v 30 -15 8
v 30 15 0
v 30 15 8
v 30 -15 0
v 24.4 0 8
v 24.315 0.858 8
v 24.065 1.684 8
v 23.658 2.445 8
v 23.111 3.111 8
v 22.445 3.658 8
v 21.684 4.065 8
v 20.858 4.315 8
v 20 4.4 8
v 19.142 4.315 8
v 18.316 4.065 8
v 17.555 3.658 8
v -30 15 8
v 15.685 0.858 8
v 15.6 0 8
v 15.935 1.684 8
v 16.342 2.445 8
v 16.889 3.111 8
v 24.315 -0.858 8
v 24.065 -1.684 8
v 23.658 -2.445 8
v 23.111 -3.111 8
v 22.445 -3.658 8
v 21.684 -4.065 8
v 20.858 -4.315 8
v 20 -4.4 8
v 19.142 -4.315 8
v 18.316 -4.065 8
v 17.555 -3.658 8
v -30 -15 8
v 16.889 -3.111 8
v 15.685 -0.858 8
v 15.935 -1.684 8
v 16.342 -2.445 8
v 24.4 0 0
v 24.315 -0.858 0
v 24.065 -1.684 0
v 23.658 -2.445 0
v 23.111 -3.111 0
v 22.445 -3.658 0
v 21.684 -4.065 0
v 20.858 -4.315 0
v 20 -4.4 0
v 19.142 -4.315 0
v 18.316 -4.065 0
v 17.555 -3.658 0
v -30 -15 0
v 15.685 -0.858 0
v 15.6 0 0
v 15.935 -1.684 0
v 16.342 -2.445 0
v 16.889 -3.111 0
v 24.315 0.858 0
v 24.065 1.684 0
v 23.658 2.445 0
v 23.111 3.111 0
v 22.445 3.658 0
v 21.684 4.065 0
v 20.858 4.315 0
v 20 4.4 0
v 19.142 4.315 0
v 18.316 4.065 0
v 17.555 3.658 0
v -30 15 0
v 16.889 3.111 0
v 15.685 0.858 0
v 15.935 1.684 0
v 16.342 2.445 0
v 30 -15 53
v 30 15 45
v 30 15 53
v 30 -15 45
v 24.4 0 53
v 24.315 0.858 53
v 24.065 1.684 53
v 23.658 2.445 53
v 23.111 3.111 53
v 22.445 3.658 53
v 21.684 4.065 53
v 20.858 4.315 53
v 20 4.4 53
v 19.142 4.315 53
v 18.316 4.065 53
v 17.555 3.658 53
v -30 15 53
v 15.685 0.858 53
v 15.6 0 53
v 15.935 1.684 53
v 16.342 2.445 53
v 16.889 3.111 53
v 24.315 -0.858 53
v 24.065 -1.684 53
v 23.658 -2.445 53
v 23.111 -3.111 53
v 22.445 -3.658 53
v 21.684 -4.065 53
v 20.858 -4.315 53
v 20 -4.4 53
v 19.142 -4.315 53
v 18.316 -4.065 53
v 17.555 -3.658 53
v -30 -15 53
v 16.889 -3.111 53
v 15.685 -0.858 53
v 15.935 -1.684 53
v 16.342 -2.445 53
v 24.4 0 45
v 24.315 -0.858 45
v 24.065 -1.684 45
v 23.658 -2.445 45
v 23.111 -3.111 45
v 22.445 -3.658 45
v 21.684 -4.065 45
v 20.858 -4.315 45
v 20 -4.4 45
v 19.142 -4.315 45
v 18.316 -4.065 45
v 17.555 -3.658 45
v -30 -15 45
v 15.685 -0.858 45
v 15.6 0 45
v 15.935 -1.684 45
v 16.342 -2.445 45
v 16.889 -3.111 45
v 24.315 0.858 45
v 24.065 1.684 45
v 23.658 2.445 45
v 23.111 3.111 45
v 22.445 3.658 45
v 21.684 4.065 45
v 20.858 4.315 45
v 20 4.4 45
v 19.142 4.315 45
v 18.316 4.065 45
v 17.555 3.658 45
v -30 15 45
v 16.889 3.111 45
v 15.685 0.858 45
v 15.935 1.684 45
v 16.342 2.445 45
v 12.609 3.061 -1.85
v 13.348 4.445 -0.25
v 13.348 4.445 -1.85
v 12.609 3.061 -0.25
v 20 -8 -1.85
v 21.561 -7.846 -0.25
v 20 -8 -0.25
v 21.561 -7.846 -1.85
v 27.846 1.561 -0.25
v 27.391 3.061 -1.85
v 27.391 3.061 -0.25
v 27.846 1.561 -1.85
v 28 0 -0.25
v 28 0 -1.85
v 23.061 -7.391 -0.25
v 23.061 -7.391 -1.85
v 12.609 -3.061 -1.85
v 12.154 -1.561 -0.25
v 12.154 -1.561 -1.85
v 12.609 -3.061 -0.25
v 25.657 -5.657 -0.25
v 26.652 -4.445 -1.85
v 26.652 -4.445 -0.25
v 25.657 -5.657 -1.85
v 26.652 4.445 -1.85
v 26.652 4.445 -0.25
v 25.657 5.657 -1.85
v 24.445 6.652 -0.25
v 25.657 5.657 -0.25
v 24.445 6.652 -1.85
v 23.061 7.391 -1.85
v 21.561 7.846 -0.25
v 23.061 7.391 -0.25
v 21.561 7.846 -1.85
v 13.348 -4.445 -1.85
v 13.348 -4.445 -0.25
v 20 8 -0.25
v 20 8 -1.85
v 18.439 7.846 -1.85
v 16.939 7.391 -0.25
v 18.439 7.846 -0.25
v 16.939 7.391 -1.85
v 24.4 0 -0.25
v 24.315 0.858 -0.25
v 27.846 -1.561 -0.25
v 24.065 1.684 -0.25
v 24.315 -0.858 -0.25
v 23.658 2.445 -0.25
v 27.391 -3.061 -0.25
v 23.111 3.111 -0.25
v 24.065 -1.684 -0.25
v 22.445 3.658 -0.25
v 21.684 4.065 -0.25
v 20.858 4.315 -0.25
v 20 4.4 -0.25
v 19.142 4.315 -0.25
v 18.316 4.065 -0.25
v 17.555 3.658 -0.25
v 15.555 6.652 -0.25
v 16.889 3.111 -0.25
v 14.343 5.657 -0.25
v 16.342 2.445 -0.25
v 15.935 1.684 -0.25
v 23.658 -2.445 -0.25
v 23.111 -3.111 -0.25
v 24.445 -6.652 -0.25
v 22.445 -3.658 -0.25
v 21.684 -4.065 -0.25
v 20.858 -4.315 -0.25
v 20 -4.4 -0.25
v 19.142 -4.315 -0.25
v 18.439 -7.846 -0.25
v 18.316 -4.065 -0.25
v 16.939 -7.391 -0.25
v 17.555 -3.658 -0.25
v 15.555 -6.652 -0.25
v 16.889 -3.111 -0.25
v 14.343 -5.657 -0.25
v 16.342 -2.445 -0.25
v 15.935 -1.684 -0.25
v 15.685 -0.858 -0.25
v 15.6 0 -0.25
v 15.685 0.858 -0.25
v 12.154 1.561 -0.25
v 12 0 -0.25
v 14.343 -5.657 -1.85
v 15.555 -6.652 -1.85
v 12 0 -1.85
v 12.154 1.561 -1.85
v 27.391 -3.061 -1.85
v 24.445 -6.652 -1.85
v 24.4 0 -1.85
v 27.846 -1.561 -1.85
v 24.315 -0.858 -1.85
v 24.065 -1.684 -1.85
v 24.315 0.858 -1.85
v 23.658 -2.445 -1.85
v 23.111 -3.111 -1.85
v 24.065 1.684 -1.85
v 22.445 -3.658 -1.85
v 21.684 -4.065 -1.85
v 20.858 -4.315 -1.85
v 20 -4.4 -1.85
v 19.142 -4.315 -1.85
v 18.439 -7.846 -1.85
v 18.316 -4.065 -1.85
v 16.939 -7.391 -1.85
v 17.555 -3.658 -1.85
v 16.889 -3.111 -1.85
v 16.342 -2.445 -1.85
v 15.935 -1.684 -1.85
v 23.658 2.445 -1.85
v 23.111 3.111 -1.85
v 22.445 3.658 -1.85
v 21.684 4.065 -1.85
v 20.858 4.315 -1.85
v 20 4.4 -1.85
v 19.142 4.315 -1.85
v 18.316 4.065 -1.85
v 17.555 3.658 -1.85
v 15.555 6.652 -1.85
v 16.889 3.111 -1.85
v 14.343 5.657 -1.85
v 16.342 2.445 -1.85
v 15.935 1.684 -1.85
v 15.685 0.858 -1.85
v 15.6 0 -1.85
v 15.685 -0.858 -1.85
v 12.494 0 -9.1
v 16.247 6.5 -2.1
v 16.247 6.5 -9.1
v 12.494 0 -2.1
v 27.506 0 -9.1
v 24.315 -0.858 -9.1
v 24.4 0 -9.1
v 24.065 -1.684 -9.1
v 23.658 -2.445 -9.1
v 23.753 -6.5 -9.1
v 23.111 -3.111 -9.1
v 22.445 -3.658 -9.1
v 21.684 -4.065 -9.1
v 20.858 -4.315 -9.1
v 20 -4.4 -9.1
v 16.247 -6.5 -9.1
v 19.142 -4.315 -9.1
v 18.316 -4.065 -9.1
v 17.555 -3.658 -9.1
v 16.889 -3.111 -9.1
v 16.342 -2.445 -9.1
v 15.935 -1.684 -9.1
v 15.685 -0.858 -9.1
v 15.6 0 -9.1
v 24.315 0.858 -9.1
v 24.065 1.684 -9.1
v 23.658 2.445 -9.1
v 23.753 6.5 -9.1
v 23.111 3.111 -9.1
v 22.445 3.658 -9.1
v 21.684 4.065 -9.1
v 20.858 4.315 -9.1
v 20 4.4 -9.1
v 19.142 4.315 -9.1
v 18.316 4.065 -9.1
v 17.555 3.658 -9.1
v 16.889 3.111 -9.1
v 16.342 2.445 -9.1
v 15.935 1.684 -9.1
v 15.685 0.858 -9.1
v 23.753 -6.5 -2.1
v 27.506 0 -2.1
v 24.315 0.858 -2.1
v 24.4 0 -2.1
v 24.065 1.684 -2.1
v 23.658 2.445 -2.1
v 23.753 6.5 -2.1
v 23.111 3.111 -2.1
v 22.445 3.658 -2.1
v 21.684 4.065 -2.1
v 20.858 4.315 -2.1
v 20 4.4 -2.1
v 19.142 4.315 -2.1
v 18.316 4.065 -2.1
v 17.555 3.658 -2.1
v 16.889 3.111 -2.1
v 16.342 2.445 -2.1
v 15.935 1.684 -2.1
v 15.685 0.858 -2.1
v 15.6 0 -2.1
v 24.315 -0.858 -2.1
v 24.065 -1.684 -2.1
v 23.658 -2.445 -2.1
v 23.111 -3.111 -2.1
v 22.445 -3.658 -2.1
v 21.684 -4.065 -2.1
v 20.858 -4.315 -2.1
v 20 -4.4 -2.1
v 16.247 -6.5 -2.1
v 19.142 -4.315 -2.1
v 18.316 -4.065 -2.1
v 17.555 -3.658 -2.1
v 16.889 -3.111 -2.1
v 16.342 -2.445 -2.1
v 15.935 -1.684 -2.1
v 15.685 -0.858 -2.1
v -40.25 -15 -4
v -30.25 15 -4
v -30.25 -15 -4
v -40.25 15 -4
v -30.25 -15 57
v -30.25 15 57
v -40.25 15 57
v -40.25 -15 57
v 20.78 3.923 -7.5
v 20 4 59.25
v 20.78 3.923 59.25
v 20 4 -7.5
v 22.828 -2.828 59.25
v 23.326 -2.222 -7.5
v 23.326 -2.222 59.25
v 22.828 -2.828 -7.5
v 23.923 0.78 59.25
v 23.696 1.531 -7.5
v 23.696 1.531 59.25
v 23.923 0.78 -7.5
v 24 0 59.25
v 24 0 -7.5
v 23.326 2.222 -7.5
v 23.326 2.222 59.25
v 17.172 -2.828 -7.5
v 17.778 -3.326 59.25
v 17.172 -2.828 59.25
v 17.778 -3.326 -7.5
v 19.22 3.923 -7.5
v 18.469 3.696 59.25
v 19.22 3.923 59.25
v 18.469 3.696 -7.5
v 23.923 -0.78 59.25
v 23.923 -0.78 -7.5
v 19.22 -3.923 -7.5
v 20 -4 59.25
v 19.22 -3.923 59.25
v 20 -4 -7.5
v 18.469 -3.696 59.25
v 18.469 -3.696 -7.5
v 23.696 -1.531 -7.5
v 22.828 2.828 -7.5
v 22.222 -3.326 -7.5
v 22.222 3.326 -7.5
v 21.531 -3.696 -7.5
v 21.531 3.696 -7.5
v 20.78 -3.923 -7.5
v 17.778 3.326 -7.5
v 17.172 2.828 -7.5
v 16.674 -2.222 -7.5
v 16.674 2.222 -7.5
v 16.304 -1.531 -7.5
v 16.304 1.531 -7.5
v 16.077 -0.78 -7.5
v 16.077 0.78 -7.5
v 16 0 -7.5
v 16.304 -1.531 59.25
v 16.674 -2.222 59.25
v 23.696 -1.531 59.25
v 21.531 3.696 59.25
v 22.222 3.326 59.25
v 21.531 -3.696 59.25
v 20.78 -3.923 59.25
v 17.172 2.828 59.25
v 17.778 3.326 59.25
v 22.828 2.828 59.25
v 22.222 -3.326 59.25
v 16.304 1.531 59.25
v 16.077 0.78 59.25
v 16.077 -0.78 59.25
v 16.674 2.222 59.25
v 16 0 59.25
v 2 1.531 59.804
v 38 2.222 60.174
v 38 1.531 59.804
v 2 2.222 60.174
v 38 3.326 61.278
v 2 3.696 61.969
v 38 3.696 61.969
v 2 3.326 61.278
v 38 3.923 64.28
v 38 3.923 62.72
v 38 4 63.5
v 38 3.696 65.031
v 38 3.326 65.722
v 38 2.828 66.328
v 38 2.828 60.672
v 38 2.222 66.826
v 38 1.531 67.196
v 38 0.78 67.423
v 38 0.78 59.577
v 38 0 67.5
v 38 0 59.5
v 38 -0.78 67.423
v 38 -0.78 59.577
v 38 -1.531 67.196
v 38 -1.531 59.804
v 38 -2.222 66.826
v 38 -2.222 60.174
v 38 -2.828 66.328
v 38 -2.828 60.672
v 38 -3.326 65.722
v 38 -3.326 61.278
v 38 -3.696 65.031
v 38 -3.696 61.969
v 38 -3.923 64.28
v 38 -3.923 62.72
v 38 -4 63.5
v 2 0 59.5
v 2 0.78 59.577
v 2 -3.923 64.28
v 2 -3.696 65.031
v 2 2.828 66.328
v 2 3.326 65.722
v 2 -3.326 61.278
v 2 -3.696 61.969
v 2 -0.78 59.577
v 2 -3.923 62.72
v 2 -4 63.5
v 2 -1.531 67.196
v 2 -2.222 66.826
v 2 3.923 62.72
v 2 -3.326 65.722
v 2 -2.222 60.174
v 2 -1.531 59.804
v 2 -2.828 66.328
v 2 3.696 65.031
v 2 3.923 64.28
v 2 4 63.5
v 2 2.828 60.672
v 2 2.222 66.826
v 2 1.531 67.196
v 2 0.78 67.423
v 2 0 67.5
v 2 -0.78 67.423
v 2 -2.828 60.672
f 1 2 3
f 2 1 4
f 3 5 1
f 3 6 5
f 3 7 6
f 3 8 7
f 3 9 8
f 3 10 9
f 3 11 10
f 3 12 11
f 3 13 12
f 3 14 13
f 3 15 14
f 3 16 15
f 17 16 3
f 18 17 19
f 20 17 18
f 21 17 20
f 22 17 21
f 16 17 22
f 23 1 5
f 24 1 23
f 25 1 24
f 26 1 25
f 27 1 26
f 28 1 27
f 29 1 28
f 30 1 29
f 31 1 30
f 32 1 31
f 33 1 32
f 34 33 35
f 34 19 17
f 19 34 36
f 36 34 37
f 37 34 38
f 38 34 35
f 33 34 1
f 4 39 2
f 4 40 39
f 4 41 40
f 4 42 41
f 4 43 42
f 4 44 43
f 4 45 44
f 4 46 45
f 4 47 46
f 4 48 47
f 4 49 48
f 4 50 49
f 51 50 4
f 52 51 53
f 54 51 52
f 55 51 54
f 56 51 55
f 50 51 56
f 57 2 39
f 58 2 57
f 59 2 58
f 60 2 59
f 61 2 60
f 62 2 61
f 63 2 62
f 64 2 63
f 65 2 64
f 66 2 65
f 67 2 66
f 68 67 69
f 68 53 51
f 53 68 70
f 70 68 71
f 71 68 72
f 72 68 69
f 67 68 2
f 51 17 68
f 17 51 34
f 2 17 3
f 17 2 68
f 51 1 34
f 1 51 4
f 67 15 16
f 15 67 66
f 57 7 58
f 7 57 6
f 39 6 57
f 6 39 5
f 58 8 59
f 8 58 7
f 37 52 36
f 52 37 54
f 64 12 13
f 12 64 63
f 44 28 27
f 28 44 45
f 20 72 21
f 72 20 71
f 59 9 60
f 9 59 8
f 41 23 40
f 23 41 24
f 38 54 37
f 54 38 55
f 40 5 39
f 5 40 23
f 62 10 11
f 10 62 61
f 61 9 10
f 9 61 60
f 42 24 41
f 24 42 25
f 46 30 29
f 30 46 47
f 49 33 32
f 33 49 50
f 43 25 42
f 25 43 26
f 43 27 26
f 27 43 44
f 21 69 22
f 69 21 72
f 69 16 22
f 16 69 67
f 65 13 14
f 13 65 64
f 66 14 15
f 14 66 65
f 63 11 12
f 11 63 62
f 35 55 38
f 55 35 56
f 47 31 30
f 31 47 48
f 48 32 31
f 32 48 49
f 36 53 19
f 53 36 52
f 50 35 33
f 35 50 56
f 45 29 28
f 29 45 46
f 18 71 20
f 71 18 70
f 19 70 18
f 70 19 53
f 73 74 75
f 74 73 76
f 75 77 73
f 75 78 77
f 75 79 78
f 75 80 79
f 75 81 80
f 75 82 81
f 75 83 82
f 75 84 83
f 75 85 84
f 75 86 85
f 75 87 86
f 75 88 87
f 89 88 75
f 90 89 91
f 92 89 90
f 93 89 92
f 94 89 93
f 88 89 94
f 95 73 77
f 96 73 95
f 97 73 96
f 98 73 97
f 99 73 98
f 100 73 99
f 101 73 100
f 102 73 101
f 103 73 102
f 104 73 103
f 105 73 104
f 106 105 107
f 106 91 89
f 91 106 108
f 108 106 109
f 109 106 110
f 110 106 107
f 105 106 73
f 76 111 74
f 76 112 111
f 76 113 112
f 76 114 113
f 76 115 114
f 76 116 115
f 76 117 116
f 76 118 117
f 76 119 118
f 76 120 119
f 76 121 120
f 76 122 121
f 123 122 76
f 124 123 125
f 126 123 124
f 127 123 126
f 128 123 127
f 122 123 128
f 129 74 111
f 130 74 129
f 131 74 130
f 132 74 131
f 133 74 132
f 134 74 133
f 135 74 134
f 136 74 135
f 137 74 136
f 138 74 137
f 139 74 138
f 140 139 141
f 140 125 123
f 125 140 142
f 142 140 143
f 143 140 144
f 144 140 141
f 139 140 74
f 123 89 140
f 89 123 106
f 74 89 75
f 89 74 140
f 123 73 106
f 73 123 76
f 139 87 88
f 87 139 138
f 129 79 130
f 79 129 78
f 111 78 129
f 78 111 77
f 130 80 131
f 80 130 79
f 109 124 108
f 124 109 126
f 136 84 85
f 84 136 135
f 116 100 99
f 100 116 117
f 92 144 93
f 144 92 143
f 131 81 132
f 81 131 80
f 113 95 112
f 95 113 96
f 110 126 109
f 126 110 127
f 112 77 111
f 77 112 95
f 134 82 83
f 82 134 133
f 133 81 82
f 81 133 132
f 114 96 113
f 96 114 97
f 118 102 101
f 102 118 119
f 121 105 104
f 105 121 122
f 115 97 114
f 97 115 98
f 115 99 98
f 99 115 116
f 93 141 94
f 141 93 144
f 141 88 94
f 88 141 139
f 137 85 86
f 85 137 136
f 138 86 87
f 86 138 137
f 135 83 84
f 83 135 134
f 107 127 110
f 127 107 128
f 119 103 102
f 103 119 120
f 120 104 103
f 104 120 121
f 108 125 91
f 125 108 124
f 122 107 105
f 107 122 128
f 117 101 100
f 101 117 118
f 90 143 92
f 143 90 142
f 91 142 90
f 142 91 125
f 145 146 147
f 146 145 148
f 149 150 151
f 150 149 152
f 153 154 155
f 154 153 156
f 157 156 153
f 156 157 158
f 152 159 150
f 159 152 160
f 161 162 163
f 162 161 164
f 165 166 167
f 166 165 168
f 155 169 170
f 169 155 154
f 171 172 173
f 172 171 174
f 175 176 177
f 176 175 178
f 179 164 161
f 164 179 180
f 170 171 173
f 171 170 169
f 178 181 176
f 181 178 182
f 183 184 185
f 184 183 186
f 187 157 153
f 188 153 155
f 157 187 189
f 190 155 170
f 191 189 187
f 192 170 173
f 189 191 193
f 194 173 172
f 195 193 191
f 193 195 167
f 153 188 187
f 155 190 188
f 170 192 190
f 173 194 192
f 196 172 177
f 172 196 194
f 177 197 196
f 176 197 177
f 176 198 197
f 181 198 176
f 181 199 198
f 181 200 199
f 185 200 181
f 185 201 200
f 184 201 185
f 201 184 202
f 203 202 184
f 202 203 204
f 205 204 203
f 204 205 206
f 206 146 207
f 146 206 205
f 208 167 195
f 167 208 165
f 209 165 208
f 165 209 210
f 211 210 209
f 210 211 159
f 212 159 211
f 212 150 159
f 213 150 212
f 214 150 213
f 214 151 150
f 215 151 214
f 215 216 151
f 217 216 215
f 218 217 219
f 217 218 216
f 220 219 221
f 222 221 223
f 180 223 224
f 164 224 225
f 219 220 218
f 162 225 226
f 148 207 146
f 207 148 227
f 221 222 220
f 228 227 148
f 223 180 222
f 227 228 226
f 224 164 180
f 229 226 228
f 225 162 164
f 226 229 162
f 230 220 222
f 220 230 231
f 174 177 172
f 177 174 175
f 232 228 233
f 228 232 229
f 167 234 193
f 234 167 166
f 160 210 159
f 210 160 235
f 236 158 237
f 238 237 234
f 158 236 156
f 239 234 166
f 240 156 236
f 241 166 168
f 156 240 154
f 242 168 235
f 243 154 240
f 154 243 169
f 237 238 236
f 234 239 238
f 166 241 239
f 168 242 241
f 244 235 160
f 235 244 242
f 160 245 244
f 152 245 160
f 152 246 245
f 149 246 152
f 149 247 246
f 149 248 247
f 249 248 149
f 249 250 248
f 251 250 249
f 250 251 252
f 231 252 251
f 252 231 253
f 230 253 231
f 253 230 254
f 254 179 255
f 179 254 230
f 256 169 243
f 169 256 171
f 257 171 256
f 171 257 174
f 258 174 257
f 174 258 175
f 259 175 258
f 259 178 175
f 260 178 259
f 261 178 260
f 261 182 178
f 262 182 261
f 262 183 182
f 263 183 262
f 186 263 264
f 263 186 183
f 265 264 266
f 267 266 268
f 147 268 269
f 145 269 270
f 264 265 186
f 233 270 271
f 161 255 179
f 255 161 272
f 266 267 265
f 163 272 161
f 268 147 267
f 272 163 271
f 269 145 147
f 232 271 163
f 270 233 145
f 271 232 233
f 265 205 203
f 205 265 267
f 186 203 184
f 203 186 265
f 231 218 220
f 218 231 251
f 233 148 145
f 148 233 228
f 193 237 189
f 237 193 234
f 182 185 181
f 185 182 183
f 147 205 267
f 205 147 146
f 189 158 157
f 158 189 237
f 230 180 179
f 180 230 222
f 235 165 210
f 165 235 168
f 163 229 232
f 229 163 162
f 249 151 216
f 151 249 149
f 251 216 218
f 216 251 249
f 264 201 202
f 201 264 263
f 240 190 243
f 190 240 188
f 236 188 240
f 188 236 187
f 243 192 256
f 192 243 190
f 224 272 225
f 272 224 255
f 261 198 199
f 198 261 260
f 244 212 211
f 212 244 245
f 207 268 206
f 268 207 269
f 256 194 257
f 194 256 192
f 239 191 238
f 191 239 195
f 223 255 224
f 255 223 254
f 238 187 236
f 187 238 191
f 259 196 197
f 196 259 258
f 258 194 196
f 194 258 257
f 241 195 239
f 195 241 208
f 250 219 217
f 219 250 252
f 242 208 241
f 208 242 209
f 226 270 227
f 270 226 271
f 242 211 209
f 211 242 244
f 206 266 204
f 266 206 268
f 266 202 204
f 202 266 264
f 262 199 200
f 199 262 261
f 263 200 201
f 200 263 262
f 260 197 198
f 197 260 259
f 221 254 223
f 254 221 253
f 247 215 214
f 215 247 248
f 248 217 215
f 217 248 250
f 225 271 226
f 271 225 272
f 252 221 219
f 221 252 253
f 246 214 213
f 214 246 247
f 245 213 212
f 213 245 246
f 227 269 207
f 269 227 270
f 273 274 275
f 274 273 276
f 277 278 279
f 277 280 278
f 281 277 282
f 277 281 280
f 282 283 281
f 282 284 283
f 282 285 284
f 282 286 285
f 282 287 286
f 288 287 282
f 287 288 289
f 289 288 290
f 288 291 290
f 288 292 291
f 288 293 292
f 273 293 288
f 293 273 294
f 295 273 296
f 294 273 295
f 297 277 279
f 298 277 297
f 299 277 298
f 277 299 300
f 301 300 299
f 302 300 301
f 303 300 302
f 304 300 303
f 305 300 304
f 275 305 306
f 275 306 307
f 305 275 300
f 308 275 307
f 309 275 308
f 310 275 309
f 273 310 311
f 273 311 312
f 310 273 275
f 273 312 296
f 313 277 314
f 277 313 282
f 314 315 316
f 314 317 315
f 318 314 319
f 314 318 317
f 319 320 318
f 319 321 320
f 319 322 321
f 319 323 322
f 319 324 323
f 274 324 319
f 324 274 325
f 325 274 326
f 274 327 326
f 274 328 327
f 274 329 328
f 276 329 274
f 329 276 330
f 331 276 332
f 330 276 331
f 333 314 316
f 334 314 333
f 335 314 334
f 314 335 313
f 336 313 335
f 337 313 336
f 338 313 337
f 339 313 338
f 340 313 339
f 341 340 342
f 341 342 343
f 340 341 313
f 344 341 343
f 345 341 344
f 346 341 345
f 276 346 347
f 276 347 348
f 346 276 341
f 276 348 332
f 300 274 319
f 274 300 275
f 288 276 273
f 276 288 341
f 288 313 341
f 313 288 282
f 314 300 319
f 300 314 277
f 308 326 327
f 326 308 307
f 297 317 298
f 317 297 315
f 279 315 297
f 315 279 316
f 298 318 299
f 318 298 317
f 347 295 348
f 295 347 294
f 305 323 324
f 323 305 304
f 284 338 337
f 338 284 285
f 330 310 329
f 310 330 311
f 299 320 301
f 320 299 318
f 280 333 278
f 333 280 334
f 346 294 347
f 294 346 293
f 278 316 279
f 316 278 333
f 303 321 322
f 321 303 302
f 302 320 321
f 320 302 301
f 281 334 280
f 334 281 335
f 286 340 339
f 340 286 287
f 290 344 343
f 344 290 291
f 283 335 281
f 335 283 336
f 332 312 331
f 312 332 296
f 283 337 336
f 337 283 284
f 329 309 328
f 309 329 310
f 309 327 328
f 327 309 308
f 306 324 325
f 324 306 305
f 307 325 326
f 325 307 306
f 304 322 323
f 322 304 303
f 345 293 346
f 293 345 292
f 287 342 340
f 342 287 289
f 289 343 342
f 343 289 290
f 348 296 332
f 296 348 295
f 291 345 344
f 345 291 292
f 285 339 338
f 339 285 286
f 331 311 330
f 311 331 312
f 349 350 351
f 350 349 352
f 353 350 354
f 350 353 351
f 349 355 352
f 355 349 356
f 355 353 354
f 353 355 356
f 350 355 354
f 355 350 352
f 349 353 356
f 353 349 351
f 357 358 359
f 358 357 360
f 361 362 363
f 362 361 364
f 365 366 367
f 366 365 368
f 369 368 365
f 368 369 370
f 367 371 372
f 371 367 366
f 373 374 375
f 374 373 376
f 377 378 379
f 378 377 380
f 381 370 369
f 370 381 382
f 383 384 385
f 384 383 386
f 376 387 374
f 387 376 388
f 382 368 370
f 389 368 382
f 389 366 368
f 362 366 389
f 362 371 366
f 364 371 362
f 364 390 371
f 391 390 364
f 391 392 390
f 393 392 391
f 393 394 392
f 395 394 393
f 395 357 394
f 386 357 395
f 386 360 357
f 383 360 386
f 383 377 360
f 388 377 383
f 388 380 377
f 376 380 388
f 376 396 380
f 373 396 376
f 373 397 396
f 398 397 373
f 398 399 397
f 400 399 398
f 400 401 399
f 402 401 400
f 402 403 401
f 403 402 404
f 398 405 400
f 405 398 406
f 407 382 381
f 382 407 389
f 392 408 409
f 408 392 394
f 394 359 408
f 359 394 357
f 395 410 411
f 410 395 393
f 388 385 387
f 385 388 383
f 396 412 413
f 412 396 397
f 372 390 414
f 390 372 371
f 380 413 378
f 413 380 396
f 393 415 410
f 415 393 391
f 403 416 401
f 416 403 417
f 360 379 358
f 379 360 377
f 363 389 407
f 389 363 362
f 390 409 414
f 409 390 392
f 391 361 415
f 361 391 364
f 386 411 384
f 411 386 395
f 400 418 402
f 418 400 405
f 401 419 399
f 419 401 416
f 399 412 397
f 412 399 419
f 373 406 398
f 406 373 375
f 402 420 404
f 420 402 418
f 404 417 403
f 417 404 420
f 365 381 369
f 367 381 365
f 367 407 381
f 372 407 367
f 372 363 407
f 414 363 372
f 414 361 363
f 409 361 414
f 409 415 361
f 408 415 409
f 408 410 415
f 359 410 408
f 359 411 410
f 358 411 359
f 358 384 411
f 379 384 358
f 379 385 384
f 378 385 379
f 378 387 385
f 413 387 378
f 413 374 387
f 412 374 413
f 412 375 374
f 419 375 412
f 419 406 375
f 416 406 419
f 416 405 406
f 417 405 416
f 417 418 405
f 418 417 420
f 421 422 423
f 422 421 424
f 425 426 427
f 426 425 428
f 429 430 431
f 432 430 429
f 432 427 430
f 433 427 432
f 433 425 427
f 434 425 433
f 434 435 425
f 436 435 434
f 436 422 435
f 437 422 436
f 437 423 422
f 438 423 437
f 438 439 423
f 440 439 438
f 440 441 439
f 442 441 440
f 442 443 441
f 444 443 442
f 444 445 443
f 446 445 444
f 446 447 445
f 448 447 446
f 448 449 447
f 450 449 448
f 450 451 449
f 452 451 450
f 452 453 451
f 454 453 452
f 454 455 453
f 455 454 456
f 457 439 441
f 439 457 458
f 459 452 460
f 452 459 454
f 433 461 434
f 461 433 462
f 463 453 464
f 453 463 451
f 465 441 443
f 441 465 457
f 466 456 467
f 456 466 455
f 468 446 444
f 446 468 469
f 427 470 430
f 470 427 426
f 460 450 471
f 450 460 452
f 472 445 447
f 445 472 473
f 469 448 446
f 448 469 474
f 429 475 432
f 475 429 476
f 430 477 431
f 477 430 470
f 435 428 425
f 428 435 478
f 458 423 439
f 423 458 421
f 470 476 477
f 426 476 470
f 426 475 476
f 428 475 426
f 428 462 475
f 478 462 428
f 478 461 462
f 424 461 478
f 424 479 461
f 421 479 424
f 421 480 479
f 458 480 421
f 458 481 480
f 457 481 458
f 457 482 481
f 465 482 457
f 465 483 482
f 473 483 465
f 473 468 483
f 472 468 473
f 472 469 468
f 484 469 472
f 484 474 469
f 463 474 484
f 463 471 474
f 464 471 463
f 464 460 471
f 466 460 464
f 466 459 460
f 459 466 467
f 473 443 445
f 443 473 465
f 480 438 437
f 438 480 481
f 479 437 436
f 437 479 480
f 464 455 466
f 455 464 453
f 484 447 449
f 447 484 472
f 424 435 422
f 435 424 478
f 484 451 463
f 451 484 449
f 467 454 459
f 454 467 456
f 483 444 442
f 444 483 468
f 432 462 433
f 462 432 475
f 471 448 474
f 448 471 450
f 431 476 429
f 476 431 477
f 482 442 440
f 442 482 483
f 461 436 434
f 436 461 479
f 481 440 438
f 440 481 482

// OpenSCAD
$fn = 32;

// ------------------------------------------------------------------------
// C clamp: throat 45 mm, screw d8
// Every part is its own module, assembly() places every instance.
// ------------------------------------------------------------------------

// --- part 1 ---
module clamp_arm() {
  difference() {
    translate([-30, -15, 0]) cube([60, 30, 8]);
    translate([20, 0, -1]) cylinder(h = 10, d = 8.8);
  }
}

// --- part 2 ---
module clamp_spine() {
  difference() {
    translate([-30.5, -15, 0]) cube([61, 30, 10]);
  }
}

// --- part 3 ---
module clamp_screw() {
  translate([0, 0, -33.375]) cylinder(h = 66.75, d = 8);
}

// --- part 4 ---
module clamp_washer() {
  difference() {
      translate([0, 0, 0]) cylinder(h = 1.6, d = 16);
      translate([0, 0, -1]) cylinder(h = 3.6, d = 8.8);
    }
}

// --- part 5 ---
module clamp_nut() {
  difference() {
    linear_extrude(height = 7) polygon(points = [[7.506, 0], [3.753, 6.5], [-3.753, 6.5], [-7.506, 0], [-3.753, -6.5], [3.753, -6.5]]);
    translate([0, 0, -1]) cylinder(h = 9, d = 8.8);
  }
}

// --- part 6 ---
module tommy_bar() {
  translate([0, 0, -18]) cylinder(h = 36, d = 8);
}

// --- assembly ---
module assembly() {
  color([0.80, 0.24, 0.20]) translate([0, 0, 0]) rotate([0, 0, 0]) clamp_arm();
  color([0.20, 0.45, 0.75]) translate([0, 0, 45]) rotate([0, 0, 0]) clamp_arm();
  color([0.25, 0.62, 0.32]) translate([-40.25, 0, 26.5]) rotate([0, 90, 0]) clamp_spine();
  color([0.92, 0.70, 0.18]) translate([20, 0, 25.875]) rotate([0, 0, 0]) clamp_screw();
  color([0.58, 0.35, 0.70]) translate([20, 0, -1.85]) rotate([0, 0, 0]) clamp_washer();
  color([0.16, 0.66, 0.66]) translate([20, 0, -9.1]) rotate([0, 0, 0]) clamp_nut();
  color([0.85, 0.48, 0.18]) translate([20, 0, 63.5]) rotate([0, 90, 0]) tommy_bar();
}

assembly();
